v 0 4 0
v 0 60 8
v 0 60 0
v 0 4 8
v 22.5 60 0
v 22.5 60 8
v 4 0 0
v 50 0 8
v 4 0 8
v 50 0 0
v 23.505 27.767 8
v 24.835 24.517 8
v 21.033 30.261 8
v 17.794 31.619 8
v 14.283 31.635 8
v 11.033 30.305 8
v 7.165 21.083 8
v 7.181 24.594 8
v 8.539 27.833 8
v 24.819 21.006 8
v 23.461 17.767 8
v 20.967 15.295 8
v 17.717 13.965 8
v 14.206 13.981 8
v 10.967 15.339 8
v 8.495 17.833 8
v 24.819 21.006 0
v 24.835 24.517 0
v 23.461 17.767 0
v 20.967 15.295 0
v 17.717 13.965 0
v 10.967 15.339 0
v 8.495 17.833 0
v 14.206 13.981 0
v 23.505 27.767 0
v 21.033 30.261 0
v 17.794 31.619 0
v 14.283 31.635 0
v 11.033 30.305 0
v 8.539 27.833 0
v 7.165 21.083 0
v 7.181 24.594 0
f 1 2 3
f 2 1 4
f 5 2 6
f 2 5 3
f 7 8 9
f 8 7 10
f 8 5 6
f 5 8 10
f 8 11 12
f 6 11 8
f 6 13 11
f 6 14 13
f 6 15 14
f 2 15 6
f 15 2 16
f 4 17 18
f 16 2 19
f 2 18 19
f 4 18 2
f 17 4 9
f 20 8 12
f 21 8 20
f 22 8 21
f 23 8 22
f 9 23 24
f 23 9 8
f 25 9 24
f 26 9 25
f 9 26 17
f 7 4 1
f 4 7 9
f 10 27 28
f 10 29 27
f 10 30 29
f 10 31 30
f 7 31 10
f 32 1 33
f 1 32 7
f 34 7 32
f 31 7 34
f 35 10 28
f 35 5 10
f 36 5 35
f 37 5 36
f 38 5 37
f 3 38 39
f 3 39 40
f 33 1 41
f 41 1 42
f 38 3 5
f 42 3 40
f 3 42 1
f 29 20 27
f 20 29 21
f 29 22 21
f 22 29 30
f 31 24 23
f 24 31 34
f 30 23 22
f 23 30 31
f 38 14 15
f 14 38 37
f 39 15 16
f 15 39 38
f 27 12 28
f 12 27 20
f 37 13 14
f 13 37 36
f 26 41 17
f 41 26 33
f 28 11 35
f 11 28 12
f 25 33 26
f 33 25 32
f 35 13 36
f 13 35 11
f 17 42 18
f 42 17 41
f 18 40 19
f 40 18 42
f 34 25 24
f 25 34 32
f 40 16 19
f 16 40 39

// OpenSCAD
$fn = 32;

// ----------------------------------------------------------------------
// Bracket plate: gusset 50 x 60
// ----------------------------------------------------------------------

// --- parameters (mm) ---
hole_r = 4;               // bolt hole radius
plate_t = 8;              // plate thickness, Z (extrusion height)
gus_a = 50;               // base length
gus_b = 60;               // height
top_x = 22.5;             // top edge X of the angled cut
light_r = 9;              // lightening hole radius

light_d = 2 * light_r;

profile = [[4, 0], [25, 0], [50, 0], [22.5, 60], [0, 60], [0, 4]];  // primary outline, 6 points, counter clockwise
void_1 = [[24.835, 24.517], [23.505, 27.767], [21.033, 30.261], [17.794, 31.619], [14.283, 31.635], [11.033, 30.305], [8.539, 27.833], [7.181, 24.594], [7.165, 21.083], [8.495, 17.833], [10.967, 15.339], [14.206, 13.981], [17.717, 13.965], [20.967, 15.295], [23.461, 17.767], [24.819, 21.006]];  // lightening hole, 16 points

// --- the one profile operation ---
difference() {
  linear_extrude(height = plate_t) polygon(points = profile);
  translate([0, 0, -1])
    linear_extrude(height = plate_t + 2) polygon(points = void_1);
}
